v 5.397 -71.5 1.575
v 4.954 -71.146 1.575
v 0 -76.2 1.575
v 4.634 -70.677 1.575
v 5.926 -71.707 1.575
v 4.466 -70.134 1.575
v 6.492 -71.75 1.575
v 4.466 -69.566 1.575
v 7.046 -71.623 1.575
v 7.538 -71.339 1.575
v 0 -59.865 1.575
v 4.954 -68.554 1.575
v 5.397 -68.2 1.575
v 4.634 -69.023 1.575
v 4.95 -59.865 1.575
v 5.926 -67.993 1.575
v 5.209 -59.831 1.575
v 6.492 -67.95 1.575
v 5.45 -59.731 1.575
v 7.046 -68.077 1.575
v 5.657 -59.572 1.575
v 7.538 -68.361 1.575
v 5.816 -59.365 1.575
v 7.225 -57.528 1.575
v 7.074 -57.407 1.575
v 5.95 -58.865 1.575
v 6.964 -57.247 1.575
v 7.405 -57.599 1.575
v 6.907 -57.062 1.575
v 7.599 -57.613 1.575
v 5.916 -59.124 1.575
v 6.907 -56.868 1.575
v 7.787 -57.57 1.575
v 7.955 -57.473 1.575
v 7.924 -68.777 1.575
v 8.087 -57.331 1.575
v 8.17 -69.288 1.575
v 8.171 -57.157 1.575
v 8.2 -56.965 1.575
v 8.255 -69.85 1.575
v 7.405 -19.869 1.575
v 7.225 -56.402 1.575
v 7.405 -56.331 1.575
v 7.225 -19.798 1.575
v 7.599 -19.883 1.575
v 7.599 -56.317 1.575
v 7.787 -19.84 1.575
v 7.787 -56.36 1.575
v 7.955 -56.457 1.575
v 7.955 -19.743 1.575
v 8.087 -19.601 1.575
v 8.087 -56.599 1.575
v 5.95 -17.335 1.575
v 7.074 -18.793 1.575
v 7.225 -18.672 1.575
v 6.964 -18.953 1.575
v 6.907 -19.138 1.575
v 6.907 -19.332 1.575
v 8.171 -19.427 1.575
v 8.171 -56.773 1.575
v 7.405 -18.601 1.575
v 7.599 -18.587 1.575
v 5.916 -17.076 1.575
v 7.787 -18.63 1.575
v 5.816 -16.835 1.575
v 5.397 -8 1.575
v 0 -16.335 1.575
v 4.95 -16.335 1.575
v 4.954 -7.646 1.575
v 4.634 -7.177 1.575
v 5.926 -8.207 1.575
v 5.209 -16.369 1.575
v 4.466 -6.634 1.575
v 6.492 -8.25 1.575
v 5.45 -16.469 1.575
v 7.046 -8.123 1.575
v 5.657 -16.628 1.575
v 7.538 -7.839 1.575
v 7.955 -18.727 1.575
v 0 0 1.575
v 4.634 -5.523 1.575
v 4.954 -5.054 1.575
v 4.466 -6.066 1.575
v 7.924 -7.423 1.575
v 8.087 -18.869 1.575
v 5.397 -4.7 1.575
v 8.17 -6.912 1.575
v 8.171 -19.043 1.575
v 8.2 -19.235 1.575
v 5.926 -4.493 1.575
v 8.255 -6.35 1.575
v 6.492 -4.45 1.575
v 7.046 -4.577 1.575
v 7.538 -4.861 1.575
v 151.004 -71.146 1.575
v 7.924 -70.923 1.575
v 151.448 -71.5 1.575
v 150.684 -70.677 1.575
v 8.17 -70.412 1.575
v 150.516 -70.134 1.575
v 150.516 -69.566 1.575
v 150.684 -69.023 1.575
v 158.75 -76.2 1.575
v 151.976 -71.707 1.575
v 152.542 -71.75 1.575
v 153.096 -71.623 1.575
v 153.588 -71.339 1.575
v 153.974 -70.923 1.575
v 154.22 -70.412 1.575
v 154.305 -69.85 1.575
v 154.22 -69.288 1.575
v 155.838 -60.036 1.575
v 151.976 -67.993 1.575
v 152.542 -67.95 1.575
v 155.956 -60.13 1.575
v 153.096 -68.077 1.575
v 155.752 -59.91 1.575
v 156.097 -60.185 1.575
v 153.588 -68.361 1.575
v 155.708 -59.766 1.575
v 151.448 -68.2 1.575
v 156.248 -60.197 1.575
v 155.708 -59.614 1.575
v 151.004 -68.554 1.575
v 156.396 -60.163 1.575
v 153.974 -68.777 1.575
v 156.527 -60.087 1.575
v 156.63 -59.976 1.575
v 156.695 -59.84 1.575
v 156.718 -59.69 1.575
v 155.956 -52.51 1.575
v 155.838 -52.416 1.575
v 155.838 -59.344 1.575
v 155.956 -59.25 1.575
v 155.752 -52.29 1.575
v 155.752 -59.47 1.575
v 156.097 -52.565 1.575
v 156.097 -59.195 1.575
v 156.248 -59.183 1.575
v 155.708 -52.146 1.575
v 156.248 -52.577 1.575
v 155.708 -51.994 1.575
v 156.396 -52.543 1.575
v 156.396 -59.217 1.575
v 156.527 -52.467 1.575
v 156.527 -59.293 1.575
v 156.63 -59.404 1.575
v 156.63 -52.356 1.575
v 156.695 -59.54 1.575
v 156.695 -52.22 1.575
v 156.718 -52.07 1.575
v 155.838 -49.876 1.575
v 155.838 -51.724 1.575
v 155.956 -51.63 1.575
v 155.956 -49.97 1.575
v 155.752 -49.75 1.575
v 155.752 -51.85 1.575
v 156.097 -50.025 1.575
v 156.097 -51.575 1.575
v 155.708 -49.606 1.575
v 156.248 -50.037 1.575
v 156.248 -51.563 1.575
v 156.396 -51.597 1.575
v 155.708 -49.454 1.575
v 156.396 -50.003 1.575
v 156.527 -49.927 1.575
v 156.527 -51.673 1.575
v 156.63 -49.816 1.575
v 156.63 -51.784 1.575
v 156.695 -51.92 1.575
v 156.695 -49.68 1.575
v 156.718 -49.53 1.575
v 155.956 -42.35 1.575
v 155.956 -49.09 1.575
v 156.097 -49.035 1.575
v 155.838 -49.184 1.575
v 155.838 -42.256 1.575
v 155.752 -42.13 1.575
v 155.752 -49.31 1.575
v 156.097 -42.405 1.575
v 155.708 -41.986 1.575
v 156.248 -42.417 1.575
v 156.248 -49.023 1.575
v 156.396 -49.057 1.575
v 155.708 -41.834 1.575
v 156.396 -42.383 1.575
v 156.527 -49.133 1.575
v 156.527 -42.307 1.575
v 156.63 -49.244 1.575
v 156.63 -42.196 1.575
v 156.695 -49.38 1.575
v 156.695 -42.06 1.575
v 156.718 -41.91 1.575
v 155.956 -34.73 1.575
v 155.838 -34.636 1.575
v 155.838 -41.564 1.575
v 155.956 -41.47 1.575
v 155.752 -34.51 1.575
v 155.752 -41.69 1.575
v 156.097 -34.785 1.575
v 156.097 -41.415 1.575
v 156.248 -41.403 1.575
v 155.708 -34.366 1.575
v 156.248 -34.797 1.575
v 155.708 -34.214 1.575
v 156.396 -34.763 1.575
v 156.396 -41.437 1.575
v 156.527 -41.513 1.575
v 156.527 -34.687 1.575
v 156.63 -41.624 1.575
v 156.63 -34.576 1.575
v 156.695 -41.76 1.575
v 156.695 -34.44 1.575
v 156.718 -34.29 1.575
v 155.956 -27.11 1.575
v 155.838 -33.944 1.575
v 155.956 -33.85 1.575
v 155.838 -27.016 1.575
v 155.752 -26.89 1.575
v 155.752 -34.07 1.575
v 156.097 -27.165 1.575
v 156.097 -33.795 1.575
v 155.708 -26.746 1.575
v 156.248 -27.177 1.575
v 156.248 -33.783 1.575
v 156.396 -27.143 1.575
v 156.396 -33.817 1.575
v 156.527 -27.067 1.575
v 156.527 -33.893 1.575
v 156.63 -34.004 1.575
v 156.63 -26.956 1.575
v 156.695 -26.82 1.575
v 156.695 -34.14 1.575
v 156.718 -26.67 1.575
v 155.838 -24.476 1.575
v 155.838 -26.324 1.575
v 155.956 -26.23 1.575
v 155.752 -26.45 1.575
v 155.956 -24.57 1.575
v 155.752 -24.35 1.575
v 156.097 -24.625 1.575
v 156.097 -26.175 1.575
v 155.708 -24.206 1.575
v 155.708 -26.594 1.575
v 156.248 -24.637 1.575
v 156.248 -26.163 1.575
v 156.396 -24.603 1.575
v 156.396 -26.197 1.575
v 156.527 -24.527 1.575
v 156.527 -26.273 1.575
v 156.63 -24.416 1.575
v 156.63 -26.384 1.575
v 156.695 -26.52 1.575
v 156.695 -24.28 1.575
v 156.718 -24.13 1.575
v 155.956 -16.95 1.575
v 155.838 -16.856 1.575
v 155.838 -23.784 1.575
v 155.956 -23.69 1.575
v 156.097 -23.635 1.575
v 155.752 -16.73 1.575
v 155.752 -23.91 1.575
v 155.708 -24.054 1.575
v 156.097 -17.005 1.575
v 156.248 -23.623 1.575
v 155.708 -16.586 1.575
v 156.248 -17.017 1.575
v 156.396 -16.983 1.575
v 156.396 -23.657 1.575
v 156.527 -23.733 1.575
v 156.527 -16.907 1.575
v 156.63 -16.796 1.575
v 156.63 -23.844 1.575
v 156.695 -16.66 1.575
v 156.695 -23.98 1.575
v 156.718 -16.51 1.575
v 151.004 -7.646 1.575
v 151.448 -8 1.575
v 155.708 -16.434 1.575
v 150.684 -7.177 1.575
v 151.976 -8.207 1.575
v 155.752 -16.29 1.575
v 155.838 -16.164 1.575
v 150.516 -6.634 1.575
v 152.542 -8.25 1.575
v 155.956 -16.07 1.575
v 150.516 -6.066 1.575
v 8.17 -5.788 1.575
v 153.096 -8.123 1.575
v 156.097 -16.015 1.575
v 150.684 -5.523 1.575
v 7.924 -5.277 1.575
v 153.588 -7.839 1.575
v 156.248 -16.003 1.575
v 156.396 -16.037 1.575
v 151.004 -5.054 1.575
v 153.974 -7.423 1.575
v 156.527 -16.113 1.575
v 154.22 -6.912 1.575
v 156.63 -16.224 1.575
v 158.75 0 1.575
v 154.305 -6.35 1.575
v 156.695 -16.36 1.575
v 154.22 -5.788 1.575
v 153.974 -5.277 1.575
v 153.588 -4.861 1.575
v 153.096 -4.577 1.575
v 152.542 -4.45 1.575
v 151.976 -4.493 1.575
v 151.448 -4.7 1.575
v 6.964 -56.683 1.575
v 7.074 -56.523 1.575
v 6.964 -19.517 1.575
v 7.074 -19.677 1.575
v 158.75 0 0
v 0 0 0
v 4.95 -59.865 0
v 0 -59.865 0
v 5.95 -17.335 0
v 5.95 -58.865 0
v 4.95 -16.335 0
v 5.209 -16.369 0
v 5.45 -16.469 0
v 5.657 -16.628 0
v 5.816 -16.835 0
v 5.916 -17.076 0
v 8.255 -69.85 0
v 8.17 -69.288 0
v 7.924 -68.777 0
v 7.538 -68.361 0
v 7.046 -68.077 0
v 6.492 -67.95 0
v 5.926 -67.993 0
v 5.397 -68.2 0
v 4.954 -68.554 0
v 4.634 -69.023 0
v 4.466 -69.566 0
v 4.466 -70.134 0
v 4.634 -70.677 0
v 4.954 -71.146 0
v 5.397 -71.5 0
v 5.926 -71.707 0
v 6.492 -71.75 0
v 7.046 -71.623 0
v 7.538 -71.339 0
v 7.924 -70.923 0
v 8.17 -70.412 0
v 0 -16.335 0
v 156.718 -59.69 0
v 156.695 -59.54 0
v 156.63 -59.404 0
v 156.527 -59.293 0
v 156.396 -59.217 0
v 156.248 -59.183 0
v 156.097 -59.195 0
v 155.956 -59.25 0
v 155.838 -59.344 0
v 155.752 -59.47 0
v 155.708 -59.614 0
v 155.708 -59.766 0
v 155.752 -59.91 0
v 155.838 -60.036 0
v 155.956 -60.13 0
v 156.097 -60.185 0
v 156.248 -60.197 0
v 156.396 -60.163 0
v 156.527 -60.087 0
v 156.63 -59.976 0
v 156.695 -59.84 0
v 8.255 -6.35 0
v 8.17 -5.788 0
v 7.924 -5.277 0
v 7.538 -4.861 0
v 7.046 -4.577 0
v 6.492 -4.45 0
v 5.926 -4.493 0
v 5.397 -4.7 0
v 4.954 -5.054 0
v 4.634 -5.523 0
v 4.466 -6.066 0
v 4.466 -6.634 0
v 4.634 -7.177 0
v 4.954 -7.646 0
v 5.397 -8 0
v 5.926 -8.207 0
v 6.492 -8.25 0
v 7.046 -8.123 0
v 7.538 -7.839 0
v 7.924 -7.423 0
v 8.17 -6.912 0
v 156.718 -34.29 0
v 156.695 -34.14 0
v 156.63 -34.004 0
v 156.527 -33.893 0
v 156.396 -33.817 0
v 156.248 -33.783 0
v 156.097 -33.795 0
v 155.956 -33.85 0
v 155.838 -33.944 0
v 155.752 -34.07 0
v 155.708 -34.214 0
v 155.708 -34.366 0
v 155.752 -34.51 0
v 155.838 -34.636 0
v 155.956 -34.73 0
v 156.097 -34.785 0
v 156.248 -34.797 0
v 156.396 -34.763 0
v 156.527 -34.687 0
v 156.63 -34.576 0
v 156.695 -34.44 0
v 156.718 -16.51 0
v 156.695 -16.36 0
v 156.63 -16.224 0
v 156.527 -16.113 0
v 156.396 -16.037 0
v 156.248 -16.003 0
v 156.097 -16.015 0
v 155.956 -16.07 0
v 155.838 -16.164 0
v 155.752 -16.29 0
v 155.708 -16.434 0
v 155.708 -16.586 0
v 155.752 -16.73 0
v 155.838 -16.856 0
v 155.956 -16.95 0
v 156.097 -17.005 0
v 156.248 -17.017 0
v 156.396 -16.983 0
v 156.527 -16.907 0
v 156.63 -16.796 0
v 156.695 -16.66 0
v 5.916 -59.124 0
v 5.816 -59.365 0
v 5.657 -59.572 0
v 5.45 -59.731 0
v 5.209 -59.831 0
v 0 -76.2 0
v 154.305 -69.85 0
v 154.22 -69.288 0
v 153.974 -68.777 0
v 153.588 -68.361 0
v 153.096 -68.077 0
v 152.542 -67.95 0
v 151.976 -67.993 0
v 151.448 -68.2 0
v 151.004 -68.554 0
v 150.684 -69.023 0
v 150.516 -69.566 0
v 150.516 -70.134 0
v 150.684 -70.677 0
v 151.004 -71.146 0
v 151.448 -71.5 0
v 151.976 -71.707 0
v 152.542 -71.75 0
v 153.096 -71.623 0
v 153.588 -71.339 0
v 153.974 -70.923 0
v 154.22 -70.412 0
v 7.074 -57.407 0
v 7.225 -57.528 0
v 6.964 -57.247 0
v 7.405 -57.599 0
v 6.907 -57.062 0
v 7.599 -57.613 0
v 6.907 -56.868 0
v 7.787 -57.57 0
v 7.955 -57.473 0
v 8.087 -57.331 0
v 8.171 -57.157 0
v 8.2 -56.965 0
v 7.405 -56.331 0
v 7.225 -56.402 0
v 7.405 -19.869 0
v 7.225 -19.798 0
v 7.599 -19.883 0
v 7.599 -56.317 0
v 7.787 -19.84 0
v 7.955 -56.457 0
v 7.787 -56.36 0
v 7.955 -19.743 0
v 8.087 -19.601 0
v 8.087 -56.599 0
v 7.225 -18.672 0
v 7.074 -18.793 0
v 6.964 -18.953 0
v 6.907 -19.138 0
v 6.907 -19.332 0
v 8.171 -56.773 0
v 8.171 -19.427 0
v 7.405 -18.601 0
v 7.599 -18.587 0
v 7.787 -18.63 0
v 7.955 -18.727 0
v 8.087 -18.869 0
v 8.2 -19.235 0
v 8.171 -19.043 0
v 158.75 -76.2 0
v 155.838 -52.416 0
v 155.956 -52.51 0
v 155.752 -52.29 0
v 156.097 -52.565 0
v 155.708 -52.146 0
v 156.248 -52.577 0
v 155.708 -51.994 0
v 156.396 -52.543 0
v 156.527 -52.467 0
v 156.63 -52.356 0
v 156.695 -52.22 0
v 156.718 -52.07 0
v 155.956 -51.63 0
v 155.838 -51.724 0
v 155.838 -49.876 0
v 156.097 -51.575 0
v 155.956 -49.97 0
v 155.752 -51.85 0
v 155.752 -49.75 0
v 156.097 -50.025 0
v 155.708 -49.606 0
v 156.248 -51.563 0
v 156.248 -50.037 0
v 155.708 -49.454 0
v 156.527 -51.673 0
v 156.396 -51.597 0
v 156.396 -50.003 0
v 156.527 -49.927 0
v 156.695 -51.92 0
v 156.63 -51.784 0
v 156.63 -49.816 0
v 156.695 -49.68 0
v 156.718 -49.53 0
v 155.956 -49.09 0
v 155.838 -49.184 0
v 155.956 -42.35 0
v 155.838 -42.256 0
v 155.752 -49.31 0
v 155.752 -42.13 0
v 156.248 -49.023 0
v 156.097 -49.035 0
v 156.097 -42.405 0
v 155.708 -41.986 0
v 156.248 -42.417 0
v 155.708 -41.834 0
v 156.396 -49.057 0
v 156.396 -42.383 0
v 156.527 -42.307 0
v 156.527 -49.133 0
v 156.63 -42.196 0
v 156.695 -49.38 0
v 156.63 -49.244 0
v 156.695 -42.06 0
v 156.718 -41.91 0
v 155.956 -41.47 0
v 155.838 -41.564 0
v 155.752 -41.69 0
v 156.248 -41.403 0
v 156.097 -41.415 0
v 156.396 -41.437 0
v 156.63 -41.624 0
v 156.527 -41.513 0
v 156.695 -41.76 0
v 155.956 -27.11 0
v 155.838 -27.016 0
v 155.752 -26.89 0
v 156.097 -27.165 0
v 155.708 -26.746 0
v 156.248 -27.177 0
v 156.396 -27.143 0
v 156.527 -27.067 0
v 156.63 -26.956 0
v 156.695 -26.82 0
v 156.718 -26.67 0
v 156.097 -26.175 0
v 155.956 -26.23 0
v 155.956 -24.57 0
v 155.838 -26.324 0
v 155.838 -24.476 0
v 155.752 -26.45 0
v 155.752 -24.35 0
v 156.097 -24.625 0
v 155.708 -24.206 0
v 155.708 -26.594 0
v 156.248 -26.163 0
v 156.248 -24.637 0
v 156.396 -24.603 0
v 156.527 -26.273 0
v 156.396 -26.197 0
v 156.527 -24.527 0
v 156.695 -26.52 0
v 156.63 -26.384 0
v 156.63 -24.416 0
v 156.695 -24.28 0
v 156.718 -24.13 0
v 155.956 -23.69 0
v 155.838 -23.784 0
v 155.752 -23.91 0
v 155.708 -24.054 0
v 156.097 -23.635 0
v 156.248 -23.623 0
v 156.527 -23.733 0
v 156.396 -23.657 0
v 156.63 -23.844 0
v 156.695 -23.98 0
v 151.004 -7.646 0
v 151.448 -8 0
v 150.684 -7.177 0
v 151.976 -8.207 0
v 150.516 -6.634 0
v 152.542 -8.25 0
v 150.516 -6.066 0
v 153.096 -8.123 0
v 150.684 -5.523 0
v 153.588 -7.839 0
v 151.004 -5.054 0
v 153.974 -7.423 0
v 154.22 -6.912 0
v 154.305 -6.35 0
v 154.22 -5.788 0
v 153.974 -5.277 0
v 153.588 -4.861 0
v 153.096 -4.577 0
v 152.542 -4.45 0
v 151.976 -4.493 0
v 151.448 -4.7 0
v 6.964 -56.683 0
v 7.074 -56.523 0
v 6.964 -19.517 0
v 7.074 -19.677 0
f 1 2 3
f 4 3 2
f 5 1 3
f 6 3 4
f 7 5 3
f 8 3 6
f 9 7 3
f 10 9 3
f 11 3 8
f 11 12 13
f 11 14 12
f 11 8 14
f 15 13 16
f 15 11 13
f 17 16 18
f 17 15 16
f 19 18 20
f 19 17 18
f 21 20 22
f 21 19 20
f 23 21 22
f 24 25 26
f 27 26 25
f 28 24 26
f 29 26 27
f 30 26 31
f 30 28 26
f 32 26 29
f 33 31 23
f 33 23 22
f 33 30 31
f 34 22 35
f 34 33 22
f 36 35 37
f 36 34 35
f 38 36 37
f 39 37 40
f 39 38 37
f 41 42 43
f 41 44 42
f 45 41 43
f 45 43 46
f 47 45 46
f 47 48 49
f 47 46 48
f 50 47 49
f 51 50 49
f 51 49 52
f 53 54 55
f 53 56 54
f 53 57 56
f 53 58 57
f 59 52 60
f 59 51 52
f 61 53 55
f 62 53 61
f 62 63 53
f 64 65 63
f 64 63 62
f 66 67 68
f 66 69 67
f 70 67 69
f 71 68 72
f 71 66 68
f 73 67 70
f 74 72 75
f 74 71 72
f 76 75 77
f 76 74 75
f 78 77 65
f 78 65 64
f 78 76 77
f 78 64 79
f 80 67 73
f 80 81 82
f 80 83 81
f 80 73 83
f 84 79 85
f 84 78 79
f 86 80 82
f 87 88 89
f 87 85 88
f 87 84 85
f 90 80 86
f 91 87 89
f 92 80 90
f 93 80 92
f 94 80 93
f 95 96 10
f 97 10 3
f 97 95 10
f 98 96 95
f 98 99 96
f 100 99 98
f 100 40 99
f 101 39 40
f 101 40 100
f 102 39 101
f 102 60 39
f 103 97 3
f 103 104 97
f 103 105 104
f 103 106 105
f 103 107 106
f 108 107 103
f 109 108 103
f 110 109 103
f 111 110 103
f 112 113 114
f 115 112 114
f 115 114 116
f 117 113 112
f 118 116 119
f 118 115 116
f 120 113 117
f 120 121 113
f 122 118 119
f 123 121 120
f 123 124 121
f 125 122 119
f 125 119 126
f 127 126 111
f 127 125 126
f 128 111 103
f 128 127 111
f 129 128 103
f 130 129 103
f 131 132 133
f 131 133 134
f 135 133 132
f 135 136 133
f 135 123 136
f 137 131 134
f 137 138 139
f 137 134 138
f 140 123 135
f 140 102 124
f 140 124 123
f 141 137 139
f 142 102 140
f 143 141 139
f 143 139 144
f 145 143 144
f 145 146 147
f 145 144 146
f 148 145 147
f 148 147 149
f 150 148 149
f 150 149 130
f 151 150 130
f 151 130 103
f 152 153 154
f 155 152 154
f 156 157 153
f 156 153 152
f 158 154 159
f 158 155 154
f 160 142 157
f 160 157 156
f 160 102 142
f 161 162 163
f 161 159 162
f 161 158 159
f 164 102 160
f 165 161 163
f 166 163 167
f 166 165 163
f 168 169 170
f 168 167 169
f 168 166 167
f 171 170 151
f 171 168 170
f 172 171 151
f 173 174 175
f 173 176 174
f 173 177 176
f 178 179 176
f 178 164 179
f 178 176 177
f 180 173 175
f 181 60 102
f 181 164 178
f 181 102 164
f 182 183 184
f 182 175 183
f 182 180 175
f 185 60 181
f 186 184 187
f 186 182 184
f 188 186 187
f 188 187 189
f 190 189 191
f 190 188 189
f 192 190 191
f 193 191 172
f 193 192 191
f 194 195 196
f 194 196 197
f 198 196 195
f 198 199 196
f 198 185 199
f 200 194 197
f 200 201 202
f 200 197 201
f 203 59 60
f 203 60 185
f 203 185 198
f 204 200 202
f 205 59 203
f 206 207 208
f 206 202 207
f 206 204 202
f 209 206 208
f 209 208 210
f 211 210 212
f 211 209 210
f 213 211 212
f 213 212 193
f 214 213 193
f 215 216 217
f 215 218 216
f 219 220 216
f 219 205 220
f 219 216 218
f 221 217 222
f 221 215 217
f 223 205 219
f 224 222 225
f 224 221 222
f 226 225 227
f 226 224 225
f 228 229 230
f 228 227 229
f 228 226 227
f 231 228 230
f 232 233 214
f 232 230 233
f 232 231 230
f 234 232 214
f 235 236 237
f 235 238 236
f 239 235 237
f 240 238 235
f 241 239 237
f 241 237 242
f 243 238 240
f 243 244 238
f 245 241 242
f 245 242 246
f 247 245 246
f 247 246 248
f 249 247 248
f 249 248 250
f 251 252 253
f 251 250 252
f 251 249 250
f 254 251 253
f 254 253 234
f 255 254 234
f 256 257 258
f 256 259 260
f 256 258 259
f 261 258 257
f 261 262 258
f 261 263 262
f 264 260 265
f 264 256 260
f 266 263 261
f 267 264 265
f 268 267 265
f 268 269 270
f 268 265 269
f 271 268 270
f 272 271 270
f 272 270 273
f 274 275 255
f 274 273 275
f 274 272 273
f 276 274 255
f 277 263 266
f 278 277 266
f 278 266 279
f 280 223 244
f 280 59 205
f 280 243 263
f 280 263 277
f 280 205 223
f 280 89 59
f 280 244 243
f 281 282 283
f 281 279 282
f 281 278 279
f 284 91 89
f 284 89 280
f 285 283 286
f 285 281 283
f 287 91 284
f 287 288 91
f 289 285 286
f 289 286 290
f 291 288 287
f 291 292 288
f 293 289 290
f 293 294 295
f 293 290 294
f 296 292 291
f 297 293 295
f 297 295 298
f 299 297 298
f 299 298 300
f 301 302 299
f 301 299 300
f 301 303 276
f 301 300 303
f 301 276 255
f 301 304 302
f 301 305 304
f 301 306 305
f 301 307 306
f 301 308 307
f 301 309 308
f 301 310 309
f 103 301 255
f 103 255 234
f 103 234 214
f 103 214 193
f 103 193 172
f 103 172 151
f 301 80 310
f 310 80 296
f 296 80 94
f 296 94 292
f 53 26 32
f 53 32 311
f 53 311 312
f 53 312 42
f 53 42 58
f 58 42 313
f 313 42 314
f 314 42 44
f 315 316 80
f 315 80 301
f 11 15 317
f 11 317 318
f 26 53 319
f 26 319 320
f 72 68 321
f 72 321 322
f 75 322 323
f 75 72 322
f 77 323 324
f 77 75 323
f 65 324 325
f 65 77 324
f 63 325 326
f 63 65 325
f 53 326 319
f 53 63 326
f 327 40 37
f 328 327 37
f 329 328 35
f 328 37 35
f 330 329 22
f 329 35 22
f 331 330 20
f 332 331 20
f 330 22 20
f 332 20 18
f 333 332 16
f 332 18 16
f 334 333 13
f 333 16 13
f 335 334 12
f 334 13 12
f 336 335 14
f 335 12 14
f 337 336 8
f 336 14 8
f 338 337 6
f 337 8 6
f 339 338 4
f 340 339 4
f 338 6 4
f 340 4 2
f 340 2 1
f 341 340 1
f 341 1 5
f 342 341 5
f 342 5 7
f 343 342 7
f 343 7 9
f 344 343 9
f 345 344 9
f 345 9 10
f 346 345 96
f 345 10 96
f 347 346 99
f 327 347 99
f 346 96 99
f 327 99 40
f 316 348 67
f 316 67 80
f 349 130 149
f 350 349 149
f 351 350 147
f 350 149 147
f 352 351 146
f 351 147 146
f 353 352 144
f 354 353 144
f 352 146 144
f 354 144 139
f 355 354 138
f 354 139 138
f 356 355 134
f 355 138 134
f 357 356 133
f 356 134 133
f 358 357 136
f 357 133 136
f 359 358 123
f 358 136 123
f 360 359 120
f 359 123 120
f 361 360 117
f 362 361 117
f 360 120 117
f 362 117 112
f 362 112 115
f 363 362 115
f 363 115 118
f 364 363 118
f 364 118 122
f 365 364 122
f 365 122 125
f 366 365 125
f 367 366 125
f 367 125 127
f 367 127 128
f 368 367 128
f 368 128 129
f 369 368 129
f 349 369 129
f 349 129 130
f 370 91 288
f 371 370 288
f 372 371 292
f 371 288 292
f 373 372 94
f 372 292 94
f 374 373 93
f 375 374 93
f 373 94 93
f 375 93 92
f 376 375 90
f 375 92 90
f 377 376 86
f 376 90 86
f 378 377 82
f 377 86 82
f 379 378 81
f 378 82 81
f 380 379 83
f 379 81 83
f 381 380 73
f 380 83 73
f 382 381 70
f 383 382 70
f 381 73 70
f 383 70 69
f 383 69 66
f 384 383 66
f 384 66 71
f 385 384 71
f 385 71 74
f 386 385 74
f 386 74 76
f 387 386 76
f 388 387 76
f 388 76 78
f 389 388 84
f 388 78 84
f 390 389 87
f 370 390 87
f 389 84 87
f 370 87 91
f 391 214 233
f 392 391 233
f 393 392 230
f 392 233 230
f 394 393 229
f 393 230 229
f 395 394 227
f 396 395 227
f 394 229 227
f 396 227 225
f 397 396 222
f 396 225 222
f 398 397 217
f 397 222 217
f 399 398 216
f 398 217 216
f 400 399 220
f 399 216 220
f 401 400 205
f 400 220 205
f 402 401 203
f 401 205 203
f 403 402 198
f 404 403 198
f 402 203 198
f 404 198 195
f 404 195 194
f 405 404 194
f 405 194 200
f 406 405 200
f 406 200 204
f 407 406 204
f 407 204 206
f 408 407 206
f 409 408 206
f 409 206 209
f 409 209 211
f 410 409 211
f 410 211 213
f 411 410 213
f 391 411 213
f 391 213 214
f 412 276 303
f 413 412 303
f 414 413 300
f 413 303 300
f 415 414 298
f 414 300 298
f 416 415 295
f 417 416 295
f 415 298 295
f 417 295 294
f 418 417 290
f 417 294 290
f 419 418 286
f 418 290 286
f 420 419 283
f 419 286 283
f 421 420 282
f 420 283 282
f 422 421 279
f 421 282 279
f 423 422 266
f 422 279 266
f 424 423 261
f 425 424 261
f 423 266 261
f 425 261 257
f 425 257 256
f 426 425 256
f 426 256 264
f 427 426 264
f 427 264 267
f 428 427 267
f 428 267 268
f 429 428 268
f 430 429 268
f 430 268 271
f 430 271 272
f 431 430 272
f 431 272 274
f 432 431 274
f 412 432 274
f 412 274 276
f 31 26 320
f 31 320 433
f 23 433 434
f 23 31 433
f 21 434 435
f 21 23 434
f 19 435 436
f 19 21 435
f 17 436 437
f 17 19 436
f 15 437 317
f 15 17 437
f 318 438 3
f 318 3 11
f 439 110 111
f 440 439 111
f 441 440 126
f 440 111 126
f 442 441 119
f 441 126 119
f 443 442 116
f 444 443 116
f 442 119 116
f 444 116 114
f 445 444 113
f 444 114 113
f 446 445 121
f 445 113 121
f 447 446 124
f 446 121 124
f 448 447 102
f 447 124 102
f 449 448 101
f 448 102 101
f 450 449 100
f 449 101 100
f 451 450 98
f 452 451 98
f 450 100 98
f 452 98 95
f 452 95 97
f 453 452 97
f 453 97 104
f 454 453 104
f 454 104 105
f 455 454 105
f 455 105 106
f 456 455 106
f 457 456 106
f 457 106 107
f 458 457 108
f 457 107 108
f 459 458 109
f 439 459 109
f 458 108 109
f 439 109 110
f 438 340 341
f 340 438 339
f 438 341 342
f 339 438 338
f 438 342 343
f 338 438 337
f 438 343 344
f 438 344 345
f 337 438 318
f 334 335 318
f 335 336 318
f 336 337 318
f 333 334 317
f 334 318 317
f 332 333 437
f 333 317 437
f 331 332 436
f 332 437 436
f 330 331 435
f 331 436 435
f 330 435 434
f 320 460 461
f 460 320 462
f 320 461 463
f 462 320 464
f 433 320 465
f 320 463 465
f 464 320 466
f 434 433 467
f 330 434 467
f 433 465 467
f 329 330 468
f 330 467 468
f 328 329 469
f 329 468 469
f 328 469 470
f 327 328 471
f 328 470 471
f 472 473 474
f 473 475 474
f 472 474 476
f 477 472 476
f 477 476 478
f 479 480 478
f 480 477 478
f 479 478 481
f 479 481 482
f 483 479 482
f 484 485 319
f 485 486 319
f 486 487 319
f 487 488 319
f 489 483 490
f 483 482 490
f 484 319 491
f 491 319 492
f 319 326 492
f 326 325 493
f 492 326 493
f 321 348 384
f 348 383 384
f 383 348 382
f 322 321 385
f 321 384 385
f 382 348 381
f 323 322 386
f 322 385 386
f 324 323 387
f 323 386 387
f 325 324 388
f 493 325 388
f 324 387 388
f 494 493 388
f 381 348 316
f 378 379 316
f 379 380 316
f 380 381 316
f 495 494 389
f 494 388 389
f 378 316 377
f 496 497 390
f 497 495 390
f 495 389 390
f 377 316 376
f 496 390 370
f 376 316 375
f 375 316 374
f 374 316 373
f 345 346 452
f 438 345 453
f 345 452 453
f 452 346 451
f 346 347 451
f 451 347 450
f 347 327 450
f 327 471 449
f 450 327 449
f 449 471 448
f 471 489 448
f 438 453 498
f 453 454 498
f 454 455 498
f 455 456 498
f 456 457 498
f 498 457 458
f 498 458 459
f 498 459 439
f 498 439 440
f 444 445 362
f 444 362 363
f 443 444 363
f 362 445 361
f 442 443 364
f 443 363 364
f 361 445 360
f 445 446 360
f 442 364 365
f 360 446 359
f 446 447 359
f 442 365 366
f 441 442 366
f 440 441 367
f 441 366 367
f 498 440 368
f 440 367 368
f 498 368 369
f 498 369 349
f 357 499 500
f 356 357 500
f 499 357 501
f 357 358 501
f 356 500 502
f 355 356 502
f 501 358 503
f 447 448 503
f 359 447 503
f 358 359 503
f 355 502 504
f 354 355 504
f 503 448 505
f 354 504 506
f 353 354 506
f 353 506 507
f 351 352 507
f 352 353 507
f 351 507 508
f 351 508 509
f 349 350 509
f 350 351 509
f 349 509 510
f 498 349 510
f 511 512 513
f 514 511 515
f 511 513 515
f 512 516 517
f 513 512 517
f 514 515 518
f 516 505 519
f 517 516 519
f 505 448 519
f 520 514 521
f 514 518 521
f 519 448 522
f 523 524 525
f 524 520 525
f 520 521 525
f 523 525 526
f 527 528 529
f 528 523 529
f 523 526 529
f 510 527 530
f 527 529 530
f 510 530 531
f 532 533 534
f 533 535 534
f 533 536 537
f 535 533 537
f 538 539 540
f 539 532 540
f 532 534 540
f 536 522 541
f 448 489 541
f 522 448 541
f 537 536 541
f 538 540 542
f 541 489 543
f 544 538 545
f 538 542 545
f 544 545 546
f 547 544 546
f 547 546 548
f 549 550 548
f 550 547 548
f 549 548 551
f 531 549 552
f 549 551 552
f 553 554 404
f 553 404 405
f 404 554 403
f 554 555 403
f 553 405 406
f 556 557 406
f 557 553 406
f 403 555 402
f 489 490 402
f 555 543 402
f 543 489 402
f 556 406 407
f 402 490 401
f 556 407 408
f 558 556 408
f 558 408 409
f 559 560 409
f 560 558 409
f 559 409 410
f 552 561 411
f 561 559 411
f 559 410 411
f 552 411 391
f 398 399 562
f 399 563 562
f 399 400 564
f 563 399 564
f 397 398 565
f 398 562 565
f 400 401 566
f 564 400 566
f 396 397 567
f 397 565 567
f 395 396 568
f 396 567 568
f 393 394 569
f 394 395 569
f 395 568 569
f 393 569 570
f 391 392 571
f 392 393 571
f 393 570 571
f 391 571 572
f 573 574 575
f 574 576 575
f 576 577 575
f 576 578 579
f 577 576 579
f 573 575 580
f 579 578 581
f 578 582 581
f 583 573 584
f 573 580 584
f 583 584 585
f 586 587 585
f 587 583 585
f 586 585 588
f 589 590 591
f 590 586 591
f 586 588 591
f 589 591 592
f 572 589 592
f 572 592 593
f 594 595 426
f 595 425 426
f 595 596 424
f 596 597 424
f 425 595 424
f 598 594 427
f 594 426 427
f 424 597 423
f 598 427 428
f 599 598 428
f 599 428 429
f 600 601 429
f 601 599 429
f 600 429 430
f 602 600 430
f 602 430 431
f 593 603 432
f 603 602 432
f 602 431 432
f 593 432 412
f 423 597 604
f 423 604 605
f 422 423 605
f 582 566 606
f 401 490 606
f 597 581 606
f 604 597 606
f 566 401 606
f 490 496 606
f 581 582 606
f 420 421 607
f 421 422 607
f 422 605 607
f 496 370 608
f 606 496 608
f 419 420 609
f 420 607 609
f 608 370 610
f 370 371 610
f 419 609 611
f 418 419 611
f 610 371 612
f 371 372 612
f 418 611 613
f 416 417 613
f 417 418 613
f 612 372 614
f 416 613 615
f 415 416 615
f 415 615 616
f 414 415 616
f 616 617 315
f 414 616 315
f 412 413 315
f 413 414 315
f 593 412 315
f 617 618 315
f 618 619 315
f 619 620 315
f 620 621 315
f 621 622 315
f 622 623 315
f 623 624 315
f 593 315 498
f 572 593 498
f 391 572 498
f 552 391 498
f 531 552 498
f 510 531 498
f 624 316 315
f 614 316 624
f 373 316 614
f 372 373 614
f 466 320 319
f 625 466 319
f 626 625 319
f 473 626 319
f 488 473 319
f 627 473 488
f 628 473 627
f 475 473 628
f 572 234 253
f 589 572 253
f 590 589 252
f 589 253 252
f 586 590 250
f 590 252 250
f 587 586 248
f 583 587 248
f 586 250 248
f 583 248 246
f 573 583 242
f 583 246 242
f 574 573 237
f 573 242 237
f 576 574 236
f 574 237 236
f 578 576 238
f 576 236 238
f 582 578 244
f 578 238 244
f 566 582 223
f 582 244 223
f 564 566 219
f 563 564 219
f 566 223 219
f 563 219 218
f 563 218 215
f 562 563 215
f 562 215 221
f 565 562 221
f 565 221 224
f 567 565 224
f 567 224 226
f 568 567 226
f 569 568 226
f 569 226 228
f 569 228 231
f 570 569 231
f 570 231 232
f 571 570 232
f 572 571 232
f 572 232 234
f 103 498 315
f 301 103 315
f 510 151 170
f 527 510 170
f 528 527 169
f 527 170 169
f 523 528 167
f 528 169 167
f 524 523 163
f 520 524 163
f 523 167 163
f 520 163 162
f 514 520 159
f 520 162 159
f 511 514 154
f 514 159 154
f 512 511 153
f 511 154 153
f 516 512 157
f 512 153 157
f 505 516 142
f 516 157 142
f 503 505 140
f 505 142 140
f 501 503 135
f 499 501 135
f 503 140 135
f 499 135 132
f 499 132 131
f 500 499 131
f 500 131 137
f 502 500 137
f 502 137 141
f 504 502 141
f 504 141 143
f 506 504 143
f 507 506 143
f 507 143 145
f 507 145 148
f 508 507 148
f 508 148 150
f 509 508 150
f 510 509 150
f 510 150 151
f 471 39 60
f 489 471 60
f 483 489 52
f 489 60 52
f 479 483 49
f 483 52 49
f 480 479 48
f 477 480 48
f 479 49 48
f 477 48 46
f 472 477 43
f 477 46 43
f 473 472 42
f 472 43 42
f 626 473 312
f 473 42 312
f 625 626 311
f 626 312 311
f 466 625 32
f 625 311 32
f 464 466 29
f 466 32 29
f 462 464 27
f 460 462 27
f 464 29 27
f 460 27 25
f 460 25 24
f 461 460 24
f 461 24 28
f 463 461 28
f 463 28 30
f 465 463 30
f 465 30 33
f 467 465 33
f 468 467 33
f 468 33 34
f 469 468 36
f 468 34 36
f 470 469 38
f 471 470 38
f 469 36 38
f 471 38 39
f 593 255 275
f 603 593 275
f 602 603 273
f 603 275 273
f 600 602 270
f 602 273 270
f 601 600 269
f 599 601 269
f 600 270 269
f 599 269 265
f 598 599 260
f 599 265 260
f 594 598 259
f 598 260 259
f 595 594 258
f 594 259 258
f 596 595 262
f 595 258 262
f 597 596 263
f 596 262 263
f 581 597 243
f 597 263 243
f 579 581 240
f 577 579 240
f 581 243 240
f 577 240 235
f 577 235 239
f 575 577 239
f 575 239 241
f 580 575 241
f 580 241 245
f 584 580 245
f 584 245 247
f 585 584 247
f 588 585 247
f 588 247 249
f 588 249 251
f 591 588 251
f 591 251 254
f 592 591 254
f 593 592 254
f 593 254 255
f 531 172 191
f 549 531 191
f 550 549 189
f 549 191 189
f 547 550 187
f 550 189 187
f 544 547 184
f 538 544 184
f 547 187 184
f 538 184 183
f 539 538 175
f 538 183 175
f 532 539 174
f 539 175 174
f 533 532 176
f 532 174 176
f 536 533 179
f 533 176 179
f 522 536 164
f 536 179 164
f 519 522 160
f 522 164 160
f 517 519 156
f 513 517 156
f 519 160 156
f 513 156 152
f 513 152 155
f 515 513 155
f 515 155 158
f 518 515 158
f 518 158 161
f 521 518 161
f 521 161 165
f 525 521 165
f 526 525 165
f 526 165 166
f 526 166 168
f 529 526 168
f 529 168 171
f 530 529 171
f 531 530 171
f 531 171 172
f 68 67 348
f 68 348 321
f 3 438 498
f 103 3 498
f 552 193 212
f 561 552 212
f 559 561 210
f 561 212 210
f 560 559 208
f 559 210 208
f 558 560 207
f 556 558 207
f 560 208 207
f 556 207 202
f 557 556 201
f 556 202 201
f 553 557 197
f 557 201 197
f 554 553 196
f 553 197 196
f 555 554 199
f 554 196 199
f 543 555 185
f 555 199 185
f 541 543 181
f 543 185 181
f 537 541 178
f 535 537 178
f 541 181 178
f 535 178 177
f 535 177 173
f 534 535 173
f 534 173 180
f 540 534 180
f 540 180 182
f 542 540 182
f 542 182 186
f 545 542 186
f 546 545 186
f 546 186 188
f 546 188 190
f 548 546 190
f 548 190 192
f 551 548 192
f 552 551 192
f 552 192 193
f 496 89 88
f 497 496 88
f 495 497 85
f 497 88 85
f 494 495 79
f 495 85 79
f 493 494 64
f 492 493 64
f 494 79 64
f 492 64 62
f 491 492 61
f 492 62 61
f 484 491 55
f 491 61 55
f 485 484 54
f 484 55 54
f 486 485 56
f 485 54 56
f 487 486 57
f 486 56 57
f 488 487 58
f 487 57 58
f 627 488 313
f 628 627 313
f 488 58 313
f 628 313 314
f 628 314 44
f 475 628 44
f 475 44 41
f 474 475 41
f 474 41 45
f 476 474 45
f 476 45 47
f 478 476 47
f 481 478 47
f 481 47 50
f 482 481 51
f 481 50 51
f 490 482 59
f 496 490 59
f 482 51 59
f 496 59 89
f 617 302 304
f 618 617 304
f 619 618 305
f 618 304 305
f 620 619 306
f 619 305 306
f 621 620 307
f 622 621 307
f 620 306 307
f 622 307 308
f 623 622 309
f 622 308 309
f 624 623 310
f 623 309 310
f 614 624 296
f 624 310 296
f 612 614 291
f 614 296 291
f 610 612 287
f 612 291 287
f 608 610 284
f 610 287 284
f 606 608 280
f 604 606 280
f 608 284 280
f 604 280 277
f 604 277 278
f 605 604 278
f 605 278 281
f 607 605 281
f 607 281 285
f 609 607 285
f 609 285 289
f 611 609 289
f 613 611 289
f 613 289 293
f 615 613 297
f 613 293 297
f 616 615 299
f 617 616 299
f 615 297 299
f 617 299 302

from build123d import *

# Parameters (mm, degrees)
SKETCH1_W               = 158.75
SKETCH1_H               = 76.2
EXTRUDE1_DEPTH          = 1.5748
SKETCH2_R               = 1.905
CUT_EXTRUDE2_DEPTH      = 1.5748
SKETCH4_R               = 0.65
CUT_EXTRUDE3_DEPTH      = 1.5748
SKETCH5_R               = 0.508
TRANSCEIVER_HOLES_DEPTH = 2.54
LPATTERN1_COUNT         = 2
LPATTERN1_PITCH         = 25.4


with BuildPart() as part:
    # Sketch1 → Extrude1 (new body)
    with BuildSketch(Plane.XY):
        with Locations((79.375, -38.1)):
            Rectangle(SKETCH1_W, SKETCH1_H)
    extrude(amount=EXTRUDE1_DEPTH)

    # Sketch2 → Cut-Extrude2 (cut)
    with BuildSketch(Plane.XY.offset(1.5748)):
        with Locations((152.4, -6.35)):
            Circle(SKETCH2_R)
        with Locations((6.35, -6.35)):
            Circle(SKETCH2_R)
        with Locations((152.4, -69.85)):
            Circle(SKETCH2_R)
        with Locations((6.35, -69.85)):
            Circle(SKETCH2_R)
    extrude(amount=-CUT_EXTRUDE2_DEPTH, mode=Mode.SUBTRACT)

    # Sketch4 → Cut-Extrude3 (cut)
    with BuildSketch(Plane.XY.offset(1.5748)):
        with Locations((7.55, -19.234912)):
            Circle(SKETCH4_R)
        with Locations((7.55, -56.965088)):
            Circle(SKETCH4_R)
        with BuildLine():
            Line((0, -16.335006), (4.95, -16.335006))
            ThreePointArc((4.95, -16.335006), (5.657106781, -16.627899219), (5.95, -17.335006))
            Line((5.95, -17.335006), (5.95, -58.865006))
            ThreePointArc((5.95, -58.865006), (5.657106781, -59.572112781), (4.95, -59.865006))
            Line((4.95, -59.865006), (0, -59.865006))
            Line((0, -59.865006), (0, -16.335006))
        make_face()
    extrude(amount=-CUT_EXTRUDE3_DEPTH, mode=Mode.SUBTRACT)

    # Sketch5 → transceiver holes (cut)
    with BuildSketch(Plane.XY.offset(1.5748)):
        with Locations((156.21, -59.69)):
            Circle(SKETCH5_R)
        with Locations((156.21, -52.07)):
            Circle(SKETCH5_R)
        with Locations((156.21, -49.53)):
            Circle(SKETCH5_R)
        with Locations((156.21, -41.91)):
            Circle(SKETCH5_R)
    transceiver_holes = extrude(amount=-TRANSCEIVER_HOLES_DEPTH, mode=Mode.SUBTRACT)

    # LPattern1: transceiver holes ×2
    with Locations(*[(0, i * LPATTERN1_PITCH, 0) for i in range(1, LPATTERN1_COUNT)]):
        add(transceiver_holes, mode=Mode.SUBTRACT)


solid = part.part
